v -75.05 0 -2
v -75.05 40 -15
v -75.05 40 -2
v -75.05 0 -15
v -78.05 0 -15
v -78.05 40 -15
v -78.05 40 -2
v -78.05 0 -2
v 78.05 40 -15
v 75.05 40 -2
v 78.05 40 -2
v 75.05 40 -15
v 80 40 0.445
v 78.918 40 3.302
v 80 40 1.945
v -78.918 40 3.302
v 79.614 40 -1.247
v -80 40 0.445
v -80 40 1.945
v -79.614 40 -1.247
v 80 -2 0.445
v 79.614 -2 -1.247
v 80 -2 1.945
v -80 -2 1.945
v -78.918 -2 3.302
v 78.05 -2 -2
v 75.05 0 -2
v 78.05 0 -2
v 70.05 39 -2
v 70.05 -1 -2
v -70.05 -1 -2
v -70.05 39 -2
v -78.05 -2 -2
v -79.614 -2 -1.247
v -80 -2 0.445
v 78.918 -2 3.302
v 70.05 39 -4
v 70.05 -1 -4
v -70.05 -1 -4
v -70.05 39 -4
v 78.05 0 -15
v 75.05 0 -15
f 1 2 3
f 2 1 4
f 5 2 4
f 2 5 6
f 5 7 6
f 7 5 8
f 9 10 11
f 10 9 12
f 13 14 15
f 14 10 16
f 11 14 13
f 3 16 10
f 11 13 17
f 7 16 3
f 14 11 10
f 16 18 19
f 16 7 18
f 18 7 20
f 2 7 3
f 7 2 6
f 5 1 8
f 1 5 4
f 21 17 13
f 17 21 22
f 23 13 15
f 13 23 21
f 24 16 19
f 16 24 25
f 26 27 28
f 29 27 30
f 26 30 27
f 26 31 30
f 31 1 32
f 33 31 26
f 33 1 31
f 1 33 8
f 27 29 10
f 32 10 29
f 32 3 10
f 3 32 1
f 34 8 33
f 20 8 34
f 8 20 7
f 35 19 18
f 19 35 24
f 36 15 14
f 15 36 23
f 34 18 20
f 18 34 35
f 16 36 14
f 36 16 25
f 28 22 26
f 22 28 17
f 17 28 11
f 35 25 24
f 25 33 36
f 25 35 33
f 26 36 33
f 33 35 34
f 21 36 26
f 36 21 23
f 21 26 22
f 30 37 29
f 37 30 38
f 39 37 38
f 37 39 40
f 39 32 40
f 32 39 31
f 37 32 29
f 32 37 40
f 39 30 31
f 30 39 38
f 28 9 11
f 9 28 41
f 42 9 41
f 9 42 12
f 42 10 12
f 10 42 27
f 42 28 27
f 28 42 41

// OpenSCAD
// we want something that can sit across the
// 5.25" bay holders, which are 146.1mm wide
w = 146.1;

// 40mm from xtop brace to fan
m = 40;

// don't interfere with the screws
h = 15;

// brace we're topping is 1.5mm wide. give it
// an extra half mm.
i = 2;

// the wings on the sides hold us onto the
// braces. if they're too thin, they'll break off.
ww = 3;

translate([-w/2, 0, 0]){
    // left wing
    translate([-(i + ww), 0, -h]){
        cube([ww, m, h]);
    }
    // common layer
    translate([-(i + ww), 0, 0]){
        minkowski(){
            cube([w + i * 2 + ww * 2, m, 1.5]);
            rotate([90, 90, 0]){
                cylinder(r = 2, h = 2);
            }
        }
    }
    // middle piece to wedge us atop bay mounts
    translate([i + 1, -1, -4]){
        cube([w - i * 2 - 2, m, 4]);
    }
    // right wing
    translate([w + i, 0, -h]){
        cube([ww, m, h]);
    }
}
